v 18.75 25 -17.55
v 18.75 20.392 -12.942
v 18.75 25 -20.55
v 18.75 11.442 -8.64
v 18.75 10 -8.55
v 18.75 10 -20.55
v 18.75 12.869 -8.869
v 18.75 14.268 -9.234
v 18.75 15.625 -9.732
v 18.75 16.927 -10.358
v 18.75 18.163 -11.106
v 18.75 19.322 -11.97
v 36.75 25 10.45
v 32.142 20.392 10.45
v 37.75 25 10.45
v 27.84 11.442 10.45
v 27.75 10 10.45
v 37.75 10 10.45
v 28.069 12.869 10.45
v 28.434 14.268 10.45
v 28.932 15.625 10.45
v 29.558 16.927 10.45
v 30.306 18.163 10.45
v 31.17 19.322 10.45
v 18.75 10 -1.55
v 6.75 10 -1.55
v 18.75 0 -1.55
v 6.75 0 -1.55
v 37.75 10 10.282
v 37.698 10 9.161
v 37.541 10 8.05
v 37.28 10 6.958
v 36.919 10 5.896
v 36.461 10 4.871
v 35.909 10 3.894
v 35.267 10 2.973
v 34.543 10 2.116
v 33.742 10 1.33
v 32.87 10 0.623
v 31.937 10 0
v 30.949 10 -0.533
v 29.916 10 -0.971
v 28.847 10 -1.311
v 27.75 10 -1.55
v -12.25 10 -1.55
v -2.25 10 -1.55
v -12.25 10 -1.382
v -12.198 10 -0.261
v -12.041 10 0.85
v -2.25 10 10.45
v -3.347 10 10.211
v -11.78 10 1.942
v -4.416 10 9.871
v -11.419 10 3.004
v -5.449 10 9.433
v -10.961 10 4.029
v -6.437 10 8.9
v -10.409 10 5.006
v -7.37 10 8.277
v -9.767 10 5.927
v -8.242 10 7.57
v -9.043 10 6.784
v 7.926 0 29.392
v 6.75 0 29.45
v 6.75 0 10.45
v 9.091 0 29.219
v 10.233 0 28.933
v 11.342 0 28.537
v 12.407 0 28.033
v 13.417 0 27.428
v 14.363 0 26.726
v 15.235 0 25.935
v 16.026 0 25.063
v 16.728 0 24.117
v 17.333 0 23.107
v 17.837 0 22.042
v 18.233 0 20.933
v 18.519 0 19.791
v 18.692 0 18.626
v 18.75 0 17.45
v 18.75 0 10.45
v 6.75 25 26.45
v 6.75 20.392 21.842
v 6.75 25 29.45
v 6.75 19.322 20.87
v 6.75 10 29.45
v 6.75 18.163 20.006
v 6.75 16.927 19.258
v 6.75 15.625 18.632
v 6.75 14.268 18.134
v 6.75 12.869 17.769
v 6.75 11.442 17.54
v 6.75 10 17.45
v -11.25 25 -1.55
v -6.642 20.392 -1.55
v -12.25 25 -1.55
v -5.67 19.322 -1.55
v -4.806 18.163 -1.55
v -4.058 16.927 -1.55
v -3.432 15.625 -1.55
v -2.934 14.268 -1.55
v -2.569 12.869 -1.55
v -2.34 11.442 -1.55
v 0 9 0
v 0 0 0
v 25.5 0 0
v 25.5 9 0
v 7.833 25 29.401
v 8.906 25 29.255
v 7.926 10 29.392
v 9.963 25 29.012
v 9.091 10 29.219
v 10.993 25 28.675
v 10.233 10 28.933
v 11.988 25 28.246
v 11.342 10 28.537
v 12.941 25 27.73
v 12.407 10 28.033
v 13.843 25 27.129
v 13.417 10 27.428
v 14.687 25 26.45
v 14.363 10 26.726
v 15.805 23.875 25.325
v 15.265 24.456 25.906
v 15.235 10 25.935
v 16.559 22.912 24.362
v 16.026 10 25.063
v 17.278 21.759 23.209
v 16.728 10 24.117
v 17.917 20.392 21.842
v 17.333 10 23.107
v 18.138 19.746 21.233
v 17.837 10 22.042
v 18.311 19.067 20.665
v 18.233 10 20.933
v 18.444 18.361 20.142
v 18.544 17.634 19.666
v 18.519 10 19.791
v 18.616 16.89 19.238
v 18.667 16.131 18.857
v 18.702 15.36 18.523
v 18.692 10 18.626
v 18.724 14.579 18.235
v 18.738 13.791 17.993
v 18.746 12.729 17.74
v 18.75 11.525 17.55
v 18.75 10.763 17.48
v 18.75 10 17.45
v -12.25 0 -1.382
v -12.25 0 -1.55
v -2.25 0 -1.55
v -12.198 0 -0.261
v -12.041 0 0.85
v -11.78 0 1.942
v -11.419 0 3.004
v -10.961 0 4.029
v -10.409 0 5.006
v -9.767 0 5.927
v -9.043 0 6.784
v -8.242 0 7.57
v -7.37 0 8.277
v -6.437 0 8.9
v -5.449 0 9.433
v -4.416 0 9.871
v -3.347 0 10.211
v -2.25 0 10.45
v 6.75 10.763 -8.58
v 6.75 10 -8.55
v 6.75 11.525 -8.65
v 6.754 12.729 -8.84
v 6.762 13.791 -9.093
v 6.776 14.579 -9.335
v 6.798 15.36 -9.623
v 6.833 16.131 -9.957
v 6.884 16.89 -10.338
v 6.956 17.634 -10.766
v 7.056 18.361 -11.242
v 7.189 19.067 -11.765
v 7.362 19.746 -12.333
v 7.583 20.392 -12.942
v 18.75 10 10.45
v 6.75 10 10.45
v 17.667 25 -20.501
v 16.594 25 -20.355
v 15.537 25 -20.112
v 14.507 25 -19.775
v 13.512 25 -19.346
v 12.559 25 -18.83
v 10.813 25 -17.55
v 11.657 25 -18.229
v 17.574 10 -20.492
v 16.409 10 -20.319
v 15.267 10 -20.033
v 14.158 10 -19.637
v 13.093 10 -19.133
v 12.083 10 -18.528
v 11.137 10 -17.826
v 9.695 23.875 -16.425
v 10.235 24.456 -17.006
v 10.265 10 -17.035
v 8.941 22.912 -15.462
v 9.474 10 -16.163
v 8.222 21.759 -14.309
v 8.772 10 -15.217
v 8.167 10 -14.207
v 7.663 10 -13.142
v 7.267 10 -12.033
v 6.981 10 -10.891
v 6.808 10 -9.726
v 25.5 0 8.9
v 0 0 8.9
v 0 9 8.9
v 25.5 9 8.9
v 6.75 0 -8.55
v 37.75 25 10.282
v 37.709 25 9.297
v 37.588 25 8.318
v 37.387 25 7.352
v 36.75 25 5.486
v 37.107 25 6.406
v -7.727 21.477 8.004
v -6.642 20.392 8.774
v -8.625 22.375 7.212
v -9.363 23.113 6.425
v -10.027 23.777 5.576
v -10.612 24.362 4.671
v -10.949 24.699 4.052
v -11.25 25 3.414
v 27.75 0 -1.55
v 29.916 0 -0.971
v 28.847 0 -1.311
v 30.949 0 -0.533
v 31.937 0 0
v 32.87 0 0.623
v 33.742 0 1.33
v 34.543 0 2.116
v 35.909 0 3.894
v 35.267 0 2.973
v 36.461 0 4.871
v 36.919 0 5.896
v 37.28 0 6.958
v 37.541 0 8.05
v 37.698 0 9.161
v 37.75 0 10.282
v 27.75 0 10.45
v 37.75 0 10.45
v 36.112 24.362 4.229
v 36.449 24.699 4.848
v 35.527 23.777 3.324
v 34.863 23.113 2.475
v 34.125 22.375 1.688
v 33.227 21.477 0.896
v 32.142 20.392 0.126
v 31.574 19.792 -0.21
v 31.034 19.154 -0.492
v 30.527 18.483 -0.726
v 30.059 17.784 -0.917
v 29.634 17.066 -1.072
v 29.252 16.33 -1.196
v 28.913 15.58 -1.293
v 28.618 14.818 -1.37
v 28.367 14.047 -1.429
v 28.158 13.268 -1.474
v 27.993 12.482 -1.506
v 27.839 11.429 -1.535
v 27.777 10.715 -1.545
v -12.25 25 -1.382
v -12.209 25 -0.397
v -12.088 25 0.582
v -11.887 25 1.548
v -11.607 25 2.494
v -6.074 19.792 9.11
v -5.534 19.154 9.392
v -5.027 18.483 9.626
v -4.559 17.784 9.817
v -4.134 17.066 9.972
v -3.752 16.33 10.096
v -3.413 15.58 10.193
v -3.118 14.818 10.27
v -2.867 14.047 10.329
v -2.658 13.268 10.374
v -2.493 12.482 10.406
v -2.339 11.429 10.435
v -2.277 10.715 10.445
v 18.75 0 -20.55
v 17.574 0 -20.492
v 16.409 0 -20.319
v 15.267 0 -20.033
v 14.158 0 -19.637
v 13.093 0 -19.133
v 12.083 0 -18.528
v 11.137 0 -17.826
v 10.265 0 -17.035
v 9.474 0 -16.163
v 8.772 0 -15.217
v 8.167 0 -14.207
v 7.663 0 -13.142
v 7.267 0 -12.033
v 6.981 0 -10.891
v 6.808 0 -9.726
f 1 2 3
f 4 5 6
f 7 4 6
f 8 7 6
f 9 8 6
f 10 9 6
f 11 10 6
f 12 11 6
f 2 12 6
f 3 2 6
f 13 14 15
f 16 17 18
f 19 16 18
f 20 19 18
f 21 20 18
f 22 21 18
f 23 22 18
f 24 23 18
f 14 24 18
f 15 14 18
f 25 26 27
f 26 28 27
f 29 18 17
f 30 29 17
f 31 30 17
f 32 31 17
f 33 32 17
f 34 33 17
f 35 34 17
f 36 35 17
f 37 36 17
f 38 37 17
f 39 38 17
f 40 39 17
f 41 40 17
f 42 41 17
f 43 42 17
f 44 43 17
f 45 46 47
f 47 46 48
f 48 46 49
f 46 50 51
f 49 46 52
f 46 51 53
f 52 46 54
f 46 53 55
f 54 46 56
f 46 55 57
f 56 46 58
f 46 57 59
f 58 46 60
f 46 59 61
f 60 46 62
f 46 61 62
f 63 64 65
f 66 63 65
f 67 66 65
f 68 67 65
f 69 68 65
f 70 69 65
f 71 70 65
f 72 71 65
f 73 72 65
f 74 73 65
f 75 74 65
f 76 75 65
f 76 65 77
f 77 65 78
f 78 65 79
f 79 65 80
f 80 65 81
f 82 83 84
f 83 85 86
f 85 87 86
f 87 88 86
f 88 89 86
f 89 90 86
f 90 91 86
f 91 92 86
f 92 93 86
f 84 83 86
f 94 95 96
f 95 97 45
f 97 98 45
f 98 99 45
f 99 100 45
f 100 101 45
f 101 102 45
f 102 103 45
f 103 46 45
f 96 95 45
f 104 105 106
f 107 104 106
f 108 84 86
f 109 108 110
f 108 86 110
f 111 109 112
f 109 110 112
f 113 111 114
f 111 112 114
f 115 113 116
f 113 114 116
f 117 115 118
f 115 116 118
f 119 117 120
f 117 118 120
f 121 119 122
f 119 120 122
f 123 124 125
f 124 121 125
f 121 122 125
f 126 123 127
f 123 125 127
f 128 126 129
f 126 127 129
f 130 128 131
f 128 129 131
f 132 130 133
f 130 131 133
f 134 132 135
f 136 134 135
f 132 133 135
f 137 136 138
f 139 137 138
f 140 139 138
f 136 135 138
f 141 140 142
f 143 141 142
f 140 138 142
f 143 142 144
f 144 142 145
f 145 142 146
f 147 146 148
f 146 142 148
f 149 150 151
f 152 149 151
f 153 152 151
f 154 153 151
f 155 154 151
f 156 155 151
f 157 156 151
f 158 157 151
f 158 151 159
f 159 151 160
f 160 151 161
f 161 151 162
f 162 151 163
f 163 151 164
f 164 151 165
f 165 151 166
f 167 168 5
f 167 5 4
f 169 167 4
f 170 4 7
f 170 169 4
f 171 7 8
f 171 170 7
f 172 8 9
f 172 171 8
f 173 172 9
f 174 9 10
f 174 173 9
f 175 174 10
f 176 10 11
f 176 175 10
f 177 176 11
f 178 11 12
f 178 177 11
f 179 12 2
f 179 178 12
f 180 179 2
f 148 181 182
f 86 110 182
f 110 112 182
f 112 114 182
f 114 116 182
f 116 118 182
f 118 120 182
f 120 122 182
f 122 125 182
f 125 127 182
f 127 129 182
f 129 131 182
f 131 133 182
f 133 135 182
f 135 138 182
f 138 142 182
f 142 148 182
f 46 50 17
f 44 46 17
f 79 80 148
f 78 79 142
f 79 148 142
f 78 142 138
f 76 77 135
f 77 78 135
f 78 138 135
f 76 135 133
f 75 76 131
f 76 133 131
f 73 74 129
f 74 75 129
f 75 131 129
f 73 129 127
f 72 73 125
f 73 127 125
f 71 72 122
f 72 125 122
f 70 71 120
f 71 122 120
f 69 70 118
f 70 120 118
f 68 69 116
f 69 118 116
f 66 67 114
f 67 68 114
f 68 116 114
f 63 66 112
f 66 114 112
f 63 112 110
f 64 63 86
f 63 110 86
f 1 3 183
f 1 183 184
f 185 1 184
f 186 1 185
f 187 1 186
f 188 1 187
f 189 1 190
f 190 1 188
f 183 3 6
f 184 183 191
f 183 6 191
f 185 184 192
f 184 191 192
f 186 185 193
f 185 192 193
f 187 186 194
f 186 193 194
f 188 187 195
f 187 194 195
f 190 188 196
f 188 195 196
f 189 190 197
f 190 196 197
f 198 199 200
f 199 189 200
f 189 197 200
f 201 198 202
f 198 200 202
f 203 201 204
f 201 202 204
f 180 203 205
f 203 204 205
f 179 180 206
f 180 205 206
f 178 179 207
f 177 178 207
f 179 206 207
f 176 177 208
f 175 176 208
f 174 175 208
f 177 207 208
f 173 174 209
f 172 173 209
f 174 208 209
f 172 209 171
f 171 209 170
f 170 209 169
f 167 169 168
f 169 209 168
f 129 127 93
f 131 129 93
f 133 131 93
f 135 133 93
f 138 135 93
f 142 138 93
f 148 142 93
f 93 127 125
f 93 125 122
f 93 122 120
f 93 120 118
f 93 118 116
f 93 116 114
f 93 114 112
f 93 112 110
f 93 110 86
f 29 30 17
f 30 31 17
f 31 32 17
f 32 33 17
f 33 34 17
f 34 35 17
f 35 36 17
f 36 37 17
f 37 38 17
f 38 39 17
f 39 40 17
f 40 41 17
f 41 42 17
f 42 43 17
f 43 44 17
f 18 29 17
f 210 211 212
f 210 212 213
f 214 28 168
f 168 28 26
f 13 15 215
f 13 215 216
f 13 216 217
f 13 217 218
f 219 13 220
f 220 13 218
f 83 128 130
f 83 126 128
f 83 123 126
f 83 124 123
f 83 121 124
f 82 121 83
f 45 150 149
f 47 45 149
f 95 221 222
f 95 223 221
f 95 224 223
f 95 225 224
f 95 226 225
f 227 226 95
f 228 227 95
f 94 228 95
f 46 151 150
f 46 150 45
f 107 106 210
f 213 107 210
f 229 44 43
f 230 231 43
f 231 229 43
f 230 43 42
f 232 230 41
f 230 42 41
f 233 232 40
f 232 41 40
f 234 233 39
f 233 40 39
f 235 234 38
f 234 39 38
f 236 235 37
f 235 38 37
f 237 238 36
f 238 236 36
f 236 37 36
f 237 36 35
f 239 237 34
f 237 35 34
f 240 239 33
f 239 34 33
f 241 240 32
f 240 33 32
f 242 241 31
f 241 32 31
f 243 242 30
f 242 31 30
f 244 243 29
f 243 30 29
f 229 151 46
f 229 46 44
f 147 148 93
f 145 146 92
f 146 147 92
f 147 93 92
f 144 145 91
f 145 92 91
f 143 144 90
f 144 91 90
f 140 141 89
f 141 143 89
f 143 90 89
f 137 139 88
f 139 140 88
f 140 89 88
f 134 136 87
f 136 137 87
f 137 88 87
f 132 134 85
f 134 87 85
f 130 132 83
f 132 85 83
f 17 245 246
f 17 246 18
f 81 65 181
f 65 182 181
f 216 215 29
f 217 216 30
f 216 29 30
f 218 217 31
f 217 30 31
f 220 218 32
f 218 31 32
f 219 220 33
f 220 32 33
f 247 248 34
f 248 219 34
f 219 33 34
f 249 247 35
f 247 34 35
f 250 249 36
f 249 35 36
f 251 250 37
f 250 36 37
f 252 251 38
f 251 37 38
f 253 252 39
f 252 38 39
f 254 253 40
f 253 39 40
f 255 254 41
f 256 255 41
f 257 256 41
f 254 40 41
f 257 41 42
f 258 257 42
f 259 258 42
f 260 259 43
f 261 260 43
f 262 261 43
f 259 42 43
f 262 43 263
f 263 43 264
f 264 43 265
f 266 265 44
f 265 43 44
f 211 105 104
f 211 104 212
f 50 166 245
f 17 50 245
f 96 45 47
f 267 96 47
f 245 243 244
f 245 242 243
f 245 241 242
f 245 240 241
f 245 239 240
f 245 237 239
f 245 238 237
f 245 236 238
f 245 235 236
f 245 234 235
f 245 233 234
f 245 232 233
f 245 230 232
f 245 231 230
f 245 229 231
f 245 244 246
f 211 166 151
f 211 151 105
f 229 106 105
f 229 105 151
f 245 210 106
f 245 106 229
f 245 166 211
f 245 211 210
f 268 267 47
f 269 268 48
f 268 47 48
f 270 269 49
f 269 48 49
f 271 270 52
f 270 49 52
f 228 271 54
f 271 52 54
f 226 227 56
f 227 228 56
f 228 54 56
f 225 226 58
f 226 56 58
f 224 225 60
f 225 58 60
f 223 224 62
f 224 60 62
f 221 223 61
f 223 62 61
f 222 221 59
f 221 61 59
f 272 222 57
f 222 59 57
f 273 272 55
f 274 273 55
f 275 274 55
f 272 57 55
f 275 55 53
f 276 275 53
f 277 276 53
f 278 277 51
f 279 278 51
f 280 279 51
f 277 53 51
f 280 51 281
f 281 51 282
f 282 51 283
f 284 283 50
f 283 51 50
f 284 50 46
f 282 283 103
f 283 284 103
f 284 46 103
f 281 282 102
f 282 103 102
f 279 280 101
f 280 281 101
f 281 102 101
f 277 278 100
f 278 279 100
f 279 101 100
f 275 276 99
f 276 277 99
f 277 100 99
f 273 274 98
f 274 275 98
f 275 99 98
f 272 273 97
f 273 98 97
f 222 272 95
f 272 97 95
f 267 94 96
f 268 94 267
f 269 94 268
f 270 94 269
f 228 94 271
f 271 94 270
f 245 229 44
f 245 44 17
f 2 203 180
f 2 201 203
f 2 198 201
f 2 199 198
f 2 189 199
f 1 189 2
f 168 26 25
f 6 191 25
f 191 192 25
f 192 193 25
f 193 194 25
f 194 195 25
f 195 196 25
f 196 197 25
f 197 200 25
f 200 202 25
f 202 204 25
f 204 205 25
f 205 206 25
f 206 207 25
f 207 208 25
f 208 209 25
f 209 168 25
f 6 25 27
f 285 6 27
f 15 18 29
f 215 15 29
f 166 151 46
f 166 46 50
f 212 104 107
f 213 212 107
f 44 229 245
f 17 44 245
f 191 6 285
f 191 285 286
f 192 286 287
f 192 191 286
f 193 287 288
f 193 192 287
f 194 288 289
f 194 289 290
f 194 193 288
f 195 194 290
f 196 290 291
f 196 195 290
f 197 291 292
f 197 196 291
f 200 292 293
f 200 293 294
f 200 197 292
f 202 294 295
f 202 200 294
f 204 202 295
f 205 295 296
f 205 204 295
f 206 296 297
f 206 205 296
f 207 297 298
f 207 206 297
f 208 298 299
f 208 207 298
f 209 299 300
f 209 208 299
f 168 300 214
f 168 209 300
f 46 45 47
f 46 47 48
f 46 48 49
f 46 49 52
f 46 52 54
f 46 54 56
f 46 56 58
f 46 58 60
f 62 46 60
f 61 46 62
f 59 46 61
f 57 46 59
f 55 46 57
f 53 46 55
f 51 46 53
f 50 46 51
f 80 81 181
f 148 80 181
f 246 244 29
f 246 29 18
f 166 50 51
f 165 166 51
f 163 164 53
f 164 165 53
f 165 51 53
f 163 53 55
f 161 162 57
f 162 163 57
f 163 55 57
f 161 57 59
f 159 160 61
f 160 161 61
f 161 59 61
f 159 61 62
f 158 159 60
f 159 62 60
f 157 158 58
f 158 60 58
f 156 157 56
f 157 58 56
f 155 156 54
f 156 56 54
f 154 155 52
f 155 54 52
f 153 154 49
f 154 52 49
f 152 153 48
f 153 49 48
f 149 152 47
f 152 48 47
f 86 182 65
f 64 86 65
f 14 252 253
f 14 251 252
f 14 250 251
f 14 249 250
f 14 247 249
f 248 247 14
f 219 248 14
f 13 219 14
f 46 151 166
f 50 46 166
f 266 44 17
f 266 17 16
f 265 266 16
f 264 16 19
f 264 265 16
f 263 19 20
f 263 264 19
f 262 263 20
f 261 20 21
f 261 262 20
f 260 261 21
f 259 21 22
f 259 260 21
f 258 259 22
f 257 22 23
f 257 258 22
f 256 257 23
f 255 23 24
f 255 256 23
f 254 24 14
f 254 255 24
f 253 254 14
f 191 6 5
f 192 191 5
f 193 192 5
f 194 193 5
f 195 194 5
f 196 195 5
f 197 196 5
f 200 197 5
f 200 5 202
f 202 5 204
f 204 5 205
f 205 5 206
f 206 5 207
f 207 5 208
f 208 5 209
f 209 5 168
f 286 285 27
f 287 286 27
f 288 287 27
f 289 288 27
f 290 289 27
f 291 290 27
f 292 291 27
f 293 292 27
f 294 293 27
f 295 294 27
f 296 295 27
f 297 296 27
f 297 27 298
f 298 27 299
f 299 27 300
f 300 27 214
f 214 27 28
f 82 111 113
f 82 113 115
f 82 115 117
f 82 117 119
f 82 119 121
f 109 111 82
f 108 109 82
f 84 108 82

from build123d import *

# Parameters (mm, degrees)
F0_W            = 25.5
F0_H            = 8.9
F1_DEPTH        = 8.9
F2_W            = 30
F2_H            = 12
F2_W_2          = 25.5
F2_H_2          = 8.9
F3_DEPTH        = 10
F4_DEPTH        = 9
F5_DEPTH        = 10
F6_DEPTH        = 10
F8_DEPTH        = 19
F10_DEPTH       = 19
F11_T1_DEPTH    = 69.160797831
F11_2_T1_DEPTH  = 69.160797831
F11_3_T1_DEPTH  = 70
F11_4_T1_DEPTH  = 70
F13_DEPTH       = 15
F14_SIZE        = 9
F15_T1_DEPTH    = 43.0551475556
F15_S1_T1_DEPTH = 43.0551475556
F15_S2_T1_DEPTH = 43.0551475556
F15_S3_T1_DEPTH = 43.0551475556


# Not quite as in the source:
# - a fillet or chamfer that OpenCascade refuses, or shapes differently, is made with other operations: its cross-section is extruded or revolved along the edge and cut away or added


with BuildPart() as f1:
    # F0 (on Top) → F1 (new body)
    with BuildSketch(Plane.XY):
        with Locations((12.75, 4.45)):
            Rectangle(F0_W, F0_H)
    extrude(amount=F1_DEPTH)


with BuildPart() as f3:
    # F2 (on face) → F3 (new body)
    with BuildSketch(Plane.XZ):
        with Locations((12.75, 4.45)):
            Rectangle(F2_W, F2_H)
        with Locations((12.75, 4.45)):
            Rectangle(F2_W_2, F2_H_2, mode=Mode.SUBTRACT)
        with Locations((12.75, 4.45)):
            Rectangle(F2_W_2, F2_H_2)
    extrude(amount=-F3_DEPTH)


with BuildPart() as f4_tool:
    # F4 (cut): a face of the model
    f4_faces = [f1.part.faces().sort_by_distance(p)[0] for p in [
        (12.75, 0, 4.45),
    ]]
    extrude(f4_faces, amount=-F4_DEPTH)


with BuildPart() as f1_1:
    add(f1.part)

    # F4: cut by f4_tool
    add(f4_tool.part, mode=Mode.SUBTRACT)


with BuildPart() as f3_1:
    add(f3.part)

    # F4: cut by f4_tool
    add(f4_tool.part, mode=Mode.SUBTRACT)


with BuildPart() as f5:
    # F5 (new): a face of the model
    f5_faces = [f3_1.part.faces().sort_by_distance(p)[0] for p in [
        (-2.25, 5, 4.45),
    ]]
    extrude(f5_faces, amount=F5_DEPTH)

    # F11: fillet of radius 12 on 1 edges, made by hand

    # F11_s2 → F11_t1 (cut)
    with BuildSketch(Plane.XZ.offset(-39.5803989155)):
        with BuildLine():
            ThreePointArc((-2.25, 10.45), (-9.4151513899, 6.3638071262), (-12.25, -1.3821595662))
            Line((-12.25, -1.3821595662), (-12.25, 10.45))
            Line((-12.25, 10.45), (-2.25, 10.45))
        make_face()
    extrude(amount=F11_T1_DEPTH, mode=Mode.SUBTRACT)


with BuildPart() as f6:
    # F6 (new): a face of the model
    f6_faces = [f3_1.part.faces().sort_by_distance(p)[0] for p in [
        (27.75, 5, 4.45),
    ]]
    extrude(f6_faces, amount=F6_DEPTH)

    # F11#2: fillet of radius 12 on 1 edges, made by hand

    # F11_2_s2 → F11_2_t1 (cut)
    with BuildSketch(Plane.XZ.offset(-39.5803989155)):
        with BuildLine():
            ThreePointArc((27.75, -1.55), (34.9151513899, 2.5361928738), (37.75, 10.2821595662))
            Line((37.75, 10.2821595662), (37.75, -1.55))
            Line((37.75, -1.55), (27.75, -1.55))
        make_face()
    extrude(amount=F11_2_T1_DEPTH, mode=Mode.SUBTRACT)


with BuildPart() as f8:
    # F7 (on face) → F8 (new body)
    with BuildSketch(Plane.XY.offset(10.45)):
        Polygon((6.75, 0), (12.75, 0), (18.75, 0), (18.75, 10), (12.75, 10), (6.75, 10), align=None)
    extrude(amount=F8_DEPTH)

    # F11#3: fillet of radius 12 on 1 edges, made by hand

    # F11_3_s2 → F11_3_t1 (cut)
    with BuildSketch(Plane.XZ.offset(-40)):
        with BuildLine():
            ThreePointArc((18.75, 17.45), (15.2352813742, 25.9352813742), (6.75, 29.45))
            Line((6.75, 29.45), (18.75, 29.45))
            Line((18.75, 29.45), (18.75, 17.45))
        make_face()
    extrude(amount=F11_3_T1_DEPTH, mode=Mode.SUBTRACT)


with BuildPart() as f10:
    # F9 (on face) → F10 (new body)
    with BuildSketch(Plane(origin=(0, 0, -1.55), x_dir=(1, 0, 0), z_dir=(0, 0, -1))):
        Polygon((6.75, -10), (12.75, -10), (18.75, -10), (18.75, 0), (12.75, 0), (6.75, 0), align=None)
    extrude(amount=F10_DEPTH)

    # F11#4: fillet of radius 12 on 1 edges, made by hand

    # F11_4_s2 → F11_4_t1 (cut)
    with BuildSketch(Plane.XZ.offset(-40)):
        with BuildLine():
            ThreePointArc((18.75, -20.55), (10.2647186258, -17.0352813742), (6.75, -8.55))
            Line((6.75, -8.55), (6.75, -20.55))
            Line((6.75, -20.55), (18.75, -20.55))
        make_face()
    extrude(amount=F11_4_T1_DEPTH, mode=Mode.SUBTRACT)


with BuildPart() as f13:
    # F12 (on face) + F6_face (on face) + F5_face (on face) → F13 (new body)
    with BuildSketch(Plane(origin=(0, 10, 0), x_dir=(-1, 0, 0), z_dir=(0, 1, 0))):
        with BuildLine():
            Line((-6.75, -8.55), (-18.75, -8.55))
            Line((-18.75, -8.55), (-18.75, -20.55))
            ThreePointArc((-18.75, -20.55), (-10.2647186258, -17.0352813742), (-6.75, -8.55))
        make_face()
        with BuildLine():
            ThreePointArc((-6.75, 29.45), (-15.2352813742, 25.9352813742), (-18.75, 17.45))
            Line((-18.75, 17.45), (-6.75, 17.45))
            Line((-6.75, 17.45), (-6.75, 29.45))
        make_face()
    with BuildSketch(Plane(origin=(31.9545650096, 10, 5.515900775), x_dir=(-1, 0, 0), z_dir=(0, 1, 0))):
        with BuildLine():
            Line((4.2045650096, -7.065900775), (4.2045650096, 4.934099225))
            Line((4.2045650096, 4.934099225), (-5.7954349904, 4.934099225))
            Line((-5.7954349904, 4.934099225), (-5.7954349904, 4.7662587912))
            ThreePointArc((-5.7954349904, 4.7662587912), (-2.9605863803, -2.9797079012), (4.2045650096, -7.065900775))
        make_face()
    with BuildSketch(Plane(origin=(-6.4545650096, 10, 3.384099225), x_dir=(-1, 0, 0), z_dir=(0, 1, 0))):
        with BuildLine():
            Line((-4.2045650096, 7.065900775), (-4.2045650096, -4.934099225))
            Line((-4.2045650096, -4.934099225), (5.7954349904, -4.934099225))
            Line((5.7954349904, -4.934099225), (5.7954349904, -4.7662587912))
            ThreePointArc((5.7954349904, -4.7662587912), (2.9605863803, 2.9797079012), (-4.2045650096, 7.065900775))
        make_face()
    extrude(amount=F13_DEPTH)

    # F14
    f14_edges = [f13.edges().sort_by_distance(p)[0] for p in [
        (-2.25, 25, 4.45),
        (12.75, 25, 17.45),
        (27.75, 25, 4.45),
        (12.75, 25, -8.55),
    ]]
    chamfer(f14_edges, length=F14_SIZE)

    # F15: fillet of radius 15 on 1 edges, made by hand

    # F15_s2 → F15_t1 (cut)
    with BuildSketch(Plane.XY.offset(-17.0775737778)):
        with BuildLine():
            ThreePointArc((-2.25, 10), (-3.4317147602, 15.6245635654), (-6.6418610855, 20.3918610855))
            Line((-6.6418610855, 20.3918610855), (-2.25, 16))
            Line((-2.25, 16), (-2.25, 10))
        make_face()
    extrude(amount=F15_T1_DEPTH, mode=Mode.SUBTRACT)

    # F15#s1: fillet of radius 15 on 1 edges, made by hand

    # F15_s1_s2 → F15_s1_t1 (cut)
    with BuildSketch(Plane.YZ.offset(-8.7775737778)):
        with BuildLine():
            ThreePointArc((10, 17.45), (15.6245635654, 18.6317147602), (20.3918610855, 21.8418610855))
            Line((20.3918610855, 21.8418610855), (16, 17.45))
            Line((16, 17.45), (10, 17.45))
        make_face()
    extrude(amount=F15_S1_T1_DEPTH, mode=Mode.SUBTRACT)

    # F15#s2: fillet of radius 15 on 1 edges, made by hand

    # F15_s2_s2 → F15_s2_t1 (cut)
    with BuildSketch(Plane.XY.offset(-17.0775737778)):
        with BuildLine():
            ThreePointArc((27.75, 10), (28.9317147602, 15.6245635654), (32.1418610855, 20.3918610855))
            Line((32.1418610855, 20.3918610855), (27.75, 16))
            Line((27.75, 16), (27.75, 10))
        make_face()
    extrude(amount=F15_S2_T1_DEPTH, mode=Mode.SUBTRACT)

    # F15#s3: fillet of radius 15 on 1 edges, made by hand

    # F15_s3_s2 → F15_s3_t1 (cut)
    with BuildSketch(Plane.YZ.offset(-8.7775737778)):
        with BuildLine():
            ThreePointArc((10, -8.55), (15.6245635654, -9.7317147602), (20.3918610855, -12.9418610855))
            Line((20.3918610855, -12.9418610855), (16, -8.55))
            Line((16, -8.55), (10, -8.55))
        make_face()
    extrude(amount=F15_S3_T1_DEPTH, mode=Mode.SUBTRACT)


solid = Compound([f3_1.part, f5.part, f6.part, f8.part, f10.part, f13.part])
